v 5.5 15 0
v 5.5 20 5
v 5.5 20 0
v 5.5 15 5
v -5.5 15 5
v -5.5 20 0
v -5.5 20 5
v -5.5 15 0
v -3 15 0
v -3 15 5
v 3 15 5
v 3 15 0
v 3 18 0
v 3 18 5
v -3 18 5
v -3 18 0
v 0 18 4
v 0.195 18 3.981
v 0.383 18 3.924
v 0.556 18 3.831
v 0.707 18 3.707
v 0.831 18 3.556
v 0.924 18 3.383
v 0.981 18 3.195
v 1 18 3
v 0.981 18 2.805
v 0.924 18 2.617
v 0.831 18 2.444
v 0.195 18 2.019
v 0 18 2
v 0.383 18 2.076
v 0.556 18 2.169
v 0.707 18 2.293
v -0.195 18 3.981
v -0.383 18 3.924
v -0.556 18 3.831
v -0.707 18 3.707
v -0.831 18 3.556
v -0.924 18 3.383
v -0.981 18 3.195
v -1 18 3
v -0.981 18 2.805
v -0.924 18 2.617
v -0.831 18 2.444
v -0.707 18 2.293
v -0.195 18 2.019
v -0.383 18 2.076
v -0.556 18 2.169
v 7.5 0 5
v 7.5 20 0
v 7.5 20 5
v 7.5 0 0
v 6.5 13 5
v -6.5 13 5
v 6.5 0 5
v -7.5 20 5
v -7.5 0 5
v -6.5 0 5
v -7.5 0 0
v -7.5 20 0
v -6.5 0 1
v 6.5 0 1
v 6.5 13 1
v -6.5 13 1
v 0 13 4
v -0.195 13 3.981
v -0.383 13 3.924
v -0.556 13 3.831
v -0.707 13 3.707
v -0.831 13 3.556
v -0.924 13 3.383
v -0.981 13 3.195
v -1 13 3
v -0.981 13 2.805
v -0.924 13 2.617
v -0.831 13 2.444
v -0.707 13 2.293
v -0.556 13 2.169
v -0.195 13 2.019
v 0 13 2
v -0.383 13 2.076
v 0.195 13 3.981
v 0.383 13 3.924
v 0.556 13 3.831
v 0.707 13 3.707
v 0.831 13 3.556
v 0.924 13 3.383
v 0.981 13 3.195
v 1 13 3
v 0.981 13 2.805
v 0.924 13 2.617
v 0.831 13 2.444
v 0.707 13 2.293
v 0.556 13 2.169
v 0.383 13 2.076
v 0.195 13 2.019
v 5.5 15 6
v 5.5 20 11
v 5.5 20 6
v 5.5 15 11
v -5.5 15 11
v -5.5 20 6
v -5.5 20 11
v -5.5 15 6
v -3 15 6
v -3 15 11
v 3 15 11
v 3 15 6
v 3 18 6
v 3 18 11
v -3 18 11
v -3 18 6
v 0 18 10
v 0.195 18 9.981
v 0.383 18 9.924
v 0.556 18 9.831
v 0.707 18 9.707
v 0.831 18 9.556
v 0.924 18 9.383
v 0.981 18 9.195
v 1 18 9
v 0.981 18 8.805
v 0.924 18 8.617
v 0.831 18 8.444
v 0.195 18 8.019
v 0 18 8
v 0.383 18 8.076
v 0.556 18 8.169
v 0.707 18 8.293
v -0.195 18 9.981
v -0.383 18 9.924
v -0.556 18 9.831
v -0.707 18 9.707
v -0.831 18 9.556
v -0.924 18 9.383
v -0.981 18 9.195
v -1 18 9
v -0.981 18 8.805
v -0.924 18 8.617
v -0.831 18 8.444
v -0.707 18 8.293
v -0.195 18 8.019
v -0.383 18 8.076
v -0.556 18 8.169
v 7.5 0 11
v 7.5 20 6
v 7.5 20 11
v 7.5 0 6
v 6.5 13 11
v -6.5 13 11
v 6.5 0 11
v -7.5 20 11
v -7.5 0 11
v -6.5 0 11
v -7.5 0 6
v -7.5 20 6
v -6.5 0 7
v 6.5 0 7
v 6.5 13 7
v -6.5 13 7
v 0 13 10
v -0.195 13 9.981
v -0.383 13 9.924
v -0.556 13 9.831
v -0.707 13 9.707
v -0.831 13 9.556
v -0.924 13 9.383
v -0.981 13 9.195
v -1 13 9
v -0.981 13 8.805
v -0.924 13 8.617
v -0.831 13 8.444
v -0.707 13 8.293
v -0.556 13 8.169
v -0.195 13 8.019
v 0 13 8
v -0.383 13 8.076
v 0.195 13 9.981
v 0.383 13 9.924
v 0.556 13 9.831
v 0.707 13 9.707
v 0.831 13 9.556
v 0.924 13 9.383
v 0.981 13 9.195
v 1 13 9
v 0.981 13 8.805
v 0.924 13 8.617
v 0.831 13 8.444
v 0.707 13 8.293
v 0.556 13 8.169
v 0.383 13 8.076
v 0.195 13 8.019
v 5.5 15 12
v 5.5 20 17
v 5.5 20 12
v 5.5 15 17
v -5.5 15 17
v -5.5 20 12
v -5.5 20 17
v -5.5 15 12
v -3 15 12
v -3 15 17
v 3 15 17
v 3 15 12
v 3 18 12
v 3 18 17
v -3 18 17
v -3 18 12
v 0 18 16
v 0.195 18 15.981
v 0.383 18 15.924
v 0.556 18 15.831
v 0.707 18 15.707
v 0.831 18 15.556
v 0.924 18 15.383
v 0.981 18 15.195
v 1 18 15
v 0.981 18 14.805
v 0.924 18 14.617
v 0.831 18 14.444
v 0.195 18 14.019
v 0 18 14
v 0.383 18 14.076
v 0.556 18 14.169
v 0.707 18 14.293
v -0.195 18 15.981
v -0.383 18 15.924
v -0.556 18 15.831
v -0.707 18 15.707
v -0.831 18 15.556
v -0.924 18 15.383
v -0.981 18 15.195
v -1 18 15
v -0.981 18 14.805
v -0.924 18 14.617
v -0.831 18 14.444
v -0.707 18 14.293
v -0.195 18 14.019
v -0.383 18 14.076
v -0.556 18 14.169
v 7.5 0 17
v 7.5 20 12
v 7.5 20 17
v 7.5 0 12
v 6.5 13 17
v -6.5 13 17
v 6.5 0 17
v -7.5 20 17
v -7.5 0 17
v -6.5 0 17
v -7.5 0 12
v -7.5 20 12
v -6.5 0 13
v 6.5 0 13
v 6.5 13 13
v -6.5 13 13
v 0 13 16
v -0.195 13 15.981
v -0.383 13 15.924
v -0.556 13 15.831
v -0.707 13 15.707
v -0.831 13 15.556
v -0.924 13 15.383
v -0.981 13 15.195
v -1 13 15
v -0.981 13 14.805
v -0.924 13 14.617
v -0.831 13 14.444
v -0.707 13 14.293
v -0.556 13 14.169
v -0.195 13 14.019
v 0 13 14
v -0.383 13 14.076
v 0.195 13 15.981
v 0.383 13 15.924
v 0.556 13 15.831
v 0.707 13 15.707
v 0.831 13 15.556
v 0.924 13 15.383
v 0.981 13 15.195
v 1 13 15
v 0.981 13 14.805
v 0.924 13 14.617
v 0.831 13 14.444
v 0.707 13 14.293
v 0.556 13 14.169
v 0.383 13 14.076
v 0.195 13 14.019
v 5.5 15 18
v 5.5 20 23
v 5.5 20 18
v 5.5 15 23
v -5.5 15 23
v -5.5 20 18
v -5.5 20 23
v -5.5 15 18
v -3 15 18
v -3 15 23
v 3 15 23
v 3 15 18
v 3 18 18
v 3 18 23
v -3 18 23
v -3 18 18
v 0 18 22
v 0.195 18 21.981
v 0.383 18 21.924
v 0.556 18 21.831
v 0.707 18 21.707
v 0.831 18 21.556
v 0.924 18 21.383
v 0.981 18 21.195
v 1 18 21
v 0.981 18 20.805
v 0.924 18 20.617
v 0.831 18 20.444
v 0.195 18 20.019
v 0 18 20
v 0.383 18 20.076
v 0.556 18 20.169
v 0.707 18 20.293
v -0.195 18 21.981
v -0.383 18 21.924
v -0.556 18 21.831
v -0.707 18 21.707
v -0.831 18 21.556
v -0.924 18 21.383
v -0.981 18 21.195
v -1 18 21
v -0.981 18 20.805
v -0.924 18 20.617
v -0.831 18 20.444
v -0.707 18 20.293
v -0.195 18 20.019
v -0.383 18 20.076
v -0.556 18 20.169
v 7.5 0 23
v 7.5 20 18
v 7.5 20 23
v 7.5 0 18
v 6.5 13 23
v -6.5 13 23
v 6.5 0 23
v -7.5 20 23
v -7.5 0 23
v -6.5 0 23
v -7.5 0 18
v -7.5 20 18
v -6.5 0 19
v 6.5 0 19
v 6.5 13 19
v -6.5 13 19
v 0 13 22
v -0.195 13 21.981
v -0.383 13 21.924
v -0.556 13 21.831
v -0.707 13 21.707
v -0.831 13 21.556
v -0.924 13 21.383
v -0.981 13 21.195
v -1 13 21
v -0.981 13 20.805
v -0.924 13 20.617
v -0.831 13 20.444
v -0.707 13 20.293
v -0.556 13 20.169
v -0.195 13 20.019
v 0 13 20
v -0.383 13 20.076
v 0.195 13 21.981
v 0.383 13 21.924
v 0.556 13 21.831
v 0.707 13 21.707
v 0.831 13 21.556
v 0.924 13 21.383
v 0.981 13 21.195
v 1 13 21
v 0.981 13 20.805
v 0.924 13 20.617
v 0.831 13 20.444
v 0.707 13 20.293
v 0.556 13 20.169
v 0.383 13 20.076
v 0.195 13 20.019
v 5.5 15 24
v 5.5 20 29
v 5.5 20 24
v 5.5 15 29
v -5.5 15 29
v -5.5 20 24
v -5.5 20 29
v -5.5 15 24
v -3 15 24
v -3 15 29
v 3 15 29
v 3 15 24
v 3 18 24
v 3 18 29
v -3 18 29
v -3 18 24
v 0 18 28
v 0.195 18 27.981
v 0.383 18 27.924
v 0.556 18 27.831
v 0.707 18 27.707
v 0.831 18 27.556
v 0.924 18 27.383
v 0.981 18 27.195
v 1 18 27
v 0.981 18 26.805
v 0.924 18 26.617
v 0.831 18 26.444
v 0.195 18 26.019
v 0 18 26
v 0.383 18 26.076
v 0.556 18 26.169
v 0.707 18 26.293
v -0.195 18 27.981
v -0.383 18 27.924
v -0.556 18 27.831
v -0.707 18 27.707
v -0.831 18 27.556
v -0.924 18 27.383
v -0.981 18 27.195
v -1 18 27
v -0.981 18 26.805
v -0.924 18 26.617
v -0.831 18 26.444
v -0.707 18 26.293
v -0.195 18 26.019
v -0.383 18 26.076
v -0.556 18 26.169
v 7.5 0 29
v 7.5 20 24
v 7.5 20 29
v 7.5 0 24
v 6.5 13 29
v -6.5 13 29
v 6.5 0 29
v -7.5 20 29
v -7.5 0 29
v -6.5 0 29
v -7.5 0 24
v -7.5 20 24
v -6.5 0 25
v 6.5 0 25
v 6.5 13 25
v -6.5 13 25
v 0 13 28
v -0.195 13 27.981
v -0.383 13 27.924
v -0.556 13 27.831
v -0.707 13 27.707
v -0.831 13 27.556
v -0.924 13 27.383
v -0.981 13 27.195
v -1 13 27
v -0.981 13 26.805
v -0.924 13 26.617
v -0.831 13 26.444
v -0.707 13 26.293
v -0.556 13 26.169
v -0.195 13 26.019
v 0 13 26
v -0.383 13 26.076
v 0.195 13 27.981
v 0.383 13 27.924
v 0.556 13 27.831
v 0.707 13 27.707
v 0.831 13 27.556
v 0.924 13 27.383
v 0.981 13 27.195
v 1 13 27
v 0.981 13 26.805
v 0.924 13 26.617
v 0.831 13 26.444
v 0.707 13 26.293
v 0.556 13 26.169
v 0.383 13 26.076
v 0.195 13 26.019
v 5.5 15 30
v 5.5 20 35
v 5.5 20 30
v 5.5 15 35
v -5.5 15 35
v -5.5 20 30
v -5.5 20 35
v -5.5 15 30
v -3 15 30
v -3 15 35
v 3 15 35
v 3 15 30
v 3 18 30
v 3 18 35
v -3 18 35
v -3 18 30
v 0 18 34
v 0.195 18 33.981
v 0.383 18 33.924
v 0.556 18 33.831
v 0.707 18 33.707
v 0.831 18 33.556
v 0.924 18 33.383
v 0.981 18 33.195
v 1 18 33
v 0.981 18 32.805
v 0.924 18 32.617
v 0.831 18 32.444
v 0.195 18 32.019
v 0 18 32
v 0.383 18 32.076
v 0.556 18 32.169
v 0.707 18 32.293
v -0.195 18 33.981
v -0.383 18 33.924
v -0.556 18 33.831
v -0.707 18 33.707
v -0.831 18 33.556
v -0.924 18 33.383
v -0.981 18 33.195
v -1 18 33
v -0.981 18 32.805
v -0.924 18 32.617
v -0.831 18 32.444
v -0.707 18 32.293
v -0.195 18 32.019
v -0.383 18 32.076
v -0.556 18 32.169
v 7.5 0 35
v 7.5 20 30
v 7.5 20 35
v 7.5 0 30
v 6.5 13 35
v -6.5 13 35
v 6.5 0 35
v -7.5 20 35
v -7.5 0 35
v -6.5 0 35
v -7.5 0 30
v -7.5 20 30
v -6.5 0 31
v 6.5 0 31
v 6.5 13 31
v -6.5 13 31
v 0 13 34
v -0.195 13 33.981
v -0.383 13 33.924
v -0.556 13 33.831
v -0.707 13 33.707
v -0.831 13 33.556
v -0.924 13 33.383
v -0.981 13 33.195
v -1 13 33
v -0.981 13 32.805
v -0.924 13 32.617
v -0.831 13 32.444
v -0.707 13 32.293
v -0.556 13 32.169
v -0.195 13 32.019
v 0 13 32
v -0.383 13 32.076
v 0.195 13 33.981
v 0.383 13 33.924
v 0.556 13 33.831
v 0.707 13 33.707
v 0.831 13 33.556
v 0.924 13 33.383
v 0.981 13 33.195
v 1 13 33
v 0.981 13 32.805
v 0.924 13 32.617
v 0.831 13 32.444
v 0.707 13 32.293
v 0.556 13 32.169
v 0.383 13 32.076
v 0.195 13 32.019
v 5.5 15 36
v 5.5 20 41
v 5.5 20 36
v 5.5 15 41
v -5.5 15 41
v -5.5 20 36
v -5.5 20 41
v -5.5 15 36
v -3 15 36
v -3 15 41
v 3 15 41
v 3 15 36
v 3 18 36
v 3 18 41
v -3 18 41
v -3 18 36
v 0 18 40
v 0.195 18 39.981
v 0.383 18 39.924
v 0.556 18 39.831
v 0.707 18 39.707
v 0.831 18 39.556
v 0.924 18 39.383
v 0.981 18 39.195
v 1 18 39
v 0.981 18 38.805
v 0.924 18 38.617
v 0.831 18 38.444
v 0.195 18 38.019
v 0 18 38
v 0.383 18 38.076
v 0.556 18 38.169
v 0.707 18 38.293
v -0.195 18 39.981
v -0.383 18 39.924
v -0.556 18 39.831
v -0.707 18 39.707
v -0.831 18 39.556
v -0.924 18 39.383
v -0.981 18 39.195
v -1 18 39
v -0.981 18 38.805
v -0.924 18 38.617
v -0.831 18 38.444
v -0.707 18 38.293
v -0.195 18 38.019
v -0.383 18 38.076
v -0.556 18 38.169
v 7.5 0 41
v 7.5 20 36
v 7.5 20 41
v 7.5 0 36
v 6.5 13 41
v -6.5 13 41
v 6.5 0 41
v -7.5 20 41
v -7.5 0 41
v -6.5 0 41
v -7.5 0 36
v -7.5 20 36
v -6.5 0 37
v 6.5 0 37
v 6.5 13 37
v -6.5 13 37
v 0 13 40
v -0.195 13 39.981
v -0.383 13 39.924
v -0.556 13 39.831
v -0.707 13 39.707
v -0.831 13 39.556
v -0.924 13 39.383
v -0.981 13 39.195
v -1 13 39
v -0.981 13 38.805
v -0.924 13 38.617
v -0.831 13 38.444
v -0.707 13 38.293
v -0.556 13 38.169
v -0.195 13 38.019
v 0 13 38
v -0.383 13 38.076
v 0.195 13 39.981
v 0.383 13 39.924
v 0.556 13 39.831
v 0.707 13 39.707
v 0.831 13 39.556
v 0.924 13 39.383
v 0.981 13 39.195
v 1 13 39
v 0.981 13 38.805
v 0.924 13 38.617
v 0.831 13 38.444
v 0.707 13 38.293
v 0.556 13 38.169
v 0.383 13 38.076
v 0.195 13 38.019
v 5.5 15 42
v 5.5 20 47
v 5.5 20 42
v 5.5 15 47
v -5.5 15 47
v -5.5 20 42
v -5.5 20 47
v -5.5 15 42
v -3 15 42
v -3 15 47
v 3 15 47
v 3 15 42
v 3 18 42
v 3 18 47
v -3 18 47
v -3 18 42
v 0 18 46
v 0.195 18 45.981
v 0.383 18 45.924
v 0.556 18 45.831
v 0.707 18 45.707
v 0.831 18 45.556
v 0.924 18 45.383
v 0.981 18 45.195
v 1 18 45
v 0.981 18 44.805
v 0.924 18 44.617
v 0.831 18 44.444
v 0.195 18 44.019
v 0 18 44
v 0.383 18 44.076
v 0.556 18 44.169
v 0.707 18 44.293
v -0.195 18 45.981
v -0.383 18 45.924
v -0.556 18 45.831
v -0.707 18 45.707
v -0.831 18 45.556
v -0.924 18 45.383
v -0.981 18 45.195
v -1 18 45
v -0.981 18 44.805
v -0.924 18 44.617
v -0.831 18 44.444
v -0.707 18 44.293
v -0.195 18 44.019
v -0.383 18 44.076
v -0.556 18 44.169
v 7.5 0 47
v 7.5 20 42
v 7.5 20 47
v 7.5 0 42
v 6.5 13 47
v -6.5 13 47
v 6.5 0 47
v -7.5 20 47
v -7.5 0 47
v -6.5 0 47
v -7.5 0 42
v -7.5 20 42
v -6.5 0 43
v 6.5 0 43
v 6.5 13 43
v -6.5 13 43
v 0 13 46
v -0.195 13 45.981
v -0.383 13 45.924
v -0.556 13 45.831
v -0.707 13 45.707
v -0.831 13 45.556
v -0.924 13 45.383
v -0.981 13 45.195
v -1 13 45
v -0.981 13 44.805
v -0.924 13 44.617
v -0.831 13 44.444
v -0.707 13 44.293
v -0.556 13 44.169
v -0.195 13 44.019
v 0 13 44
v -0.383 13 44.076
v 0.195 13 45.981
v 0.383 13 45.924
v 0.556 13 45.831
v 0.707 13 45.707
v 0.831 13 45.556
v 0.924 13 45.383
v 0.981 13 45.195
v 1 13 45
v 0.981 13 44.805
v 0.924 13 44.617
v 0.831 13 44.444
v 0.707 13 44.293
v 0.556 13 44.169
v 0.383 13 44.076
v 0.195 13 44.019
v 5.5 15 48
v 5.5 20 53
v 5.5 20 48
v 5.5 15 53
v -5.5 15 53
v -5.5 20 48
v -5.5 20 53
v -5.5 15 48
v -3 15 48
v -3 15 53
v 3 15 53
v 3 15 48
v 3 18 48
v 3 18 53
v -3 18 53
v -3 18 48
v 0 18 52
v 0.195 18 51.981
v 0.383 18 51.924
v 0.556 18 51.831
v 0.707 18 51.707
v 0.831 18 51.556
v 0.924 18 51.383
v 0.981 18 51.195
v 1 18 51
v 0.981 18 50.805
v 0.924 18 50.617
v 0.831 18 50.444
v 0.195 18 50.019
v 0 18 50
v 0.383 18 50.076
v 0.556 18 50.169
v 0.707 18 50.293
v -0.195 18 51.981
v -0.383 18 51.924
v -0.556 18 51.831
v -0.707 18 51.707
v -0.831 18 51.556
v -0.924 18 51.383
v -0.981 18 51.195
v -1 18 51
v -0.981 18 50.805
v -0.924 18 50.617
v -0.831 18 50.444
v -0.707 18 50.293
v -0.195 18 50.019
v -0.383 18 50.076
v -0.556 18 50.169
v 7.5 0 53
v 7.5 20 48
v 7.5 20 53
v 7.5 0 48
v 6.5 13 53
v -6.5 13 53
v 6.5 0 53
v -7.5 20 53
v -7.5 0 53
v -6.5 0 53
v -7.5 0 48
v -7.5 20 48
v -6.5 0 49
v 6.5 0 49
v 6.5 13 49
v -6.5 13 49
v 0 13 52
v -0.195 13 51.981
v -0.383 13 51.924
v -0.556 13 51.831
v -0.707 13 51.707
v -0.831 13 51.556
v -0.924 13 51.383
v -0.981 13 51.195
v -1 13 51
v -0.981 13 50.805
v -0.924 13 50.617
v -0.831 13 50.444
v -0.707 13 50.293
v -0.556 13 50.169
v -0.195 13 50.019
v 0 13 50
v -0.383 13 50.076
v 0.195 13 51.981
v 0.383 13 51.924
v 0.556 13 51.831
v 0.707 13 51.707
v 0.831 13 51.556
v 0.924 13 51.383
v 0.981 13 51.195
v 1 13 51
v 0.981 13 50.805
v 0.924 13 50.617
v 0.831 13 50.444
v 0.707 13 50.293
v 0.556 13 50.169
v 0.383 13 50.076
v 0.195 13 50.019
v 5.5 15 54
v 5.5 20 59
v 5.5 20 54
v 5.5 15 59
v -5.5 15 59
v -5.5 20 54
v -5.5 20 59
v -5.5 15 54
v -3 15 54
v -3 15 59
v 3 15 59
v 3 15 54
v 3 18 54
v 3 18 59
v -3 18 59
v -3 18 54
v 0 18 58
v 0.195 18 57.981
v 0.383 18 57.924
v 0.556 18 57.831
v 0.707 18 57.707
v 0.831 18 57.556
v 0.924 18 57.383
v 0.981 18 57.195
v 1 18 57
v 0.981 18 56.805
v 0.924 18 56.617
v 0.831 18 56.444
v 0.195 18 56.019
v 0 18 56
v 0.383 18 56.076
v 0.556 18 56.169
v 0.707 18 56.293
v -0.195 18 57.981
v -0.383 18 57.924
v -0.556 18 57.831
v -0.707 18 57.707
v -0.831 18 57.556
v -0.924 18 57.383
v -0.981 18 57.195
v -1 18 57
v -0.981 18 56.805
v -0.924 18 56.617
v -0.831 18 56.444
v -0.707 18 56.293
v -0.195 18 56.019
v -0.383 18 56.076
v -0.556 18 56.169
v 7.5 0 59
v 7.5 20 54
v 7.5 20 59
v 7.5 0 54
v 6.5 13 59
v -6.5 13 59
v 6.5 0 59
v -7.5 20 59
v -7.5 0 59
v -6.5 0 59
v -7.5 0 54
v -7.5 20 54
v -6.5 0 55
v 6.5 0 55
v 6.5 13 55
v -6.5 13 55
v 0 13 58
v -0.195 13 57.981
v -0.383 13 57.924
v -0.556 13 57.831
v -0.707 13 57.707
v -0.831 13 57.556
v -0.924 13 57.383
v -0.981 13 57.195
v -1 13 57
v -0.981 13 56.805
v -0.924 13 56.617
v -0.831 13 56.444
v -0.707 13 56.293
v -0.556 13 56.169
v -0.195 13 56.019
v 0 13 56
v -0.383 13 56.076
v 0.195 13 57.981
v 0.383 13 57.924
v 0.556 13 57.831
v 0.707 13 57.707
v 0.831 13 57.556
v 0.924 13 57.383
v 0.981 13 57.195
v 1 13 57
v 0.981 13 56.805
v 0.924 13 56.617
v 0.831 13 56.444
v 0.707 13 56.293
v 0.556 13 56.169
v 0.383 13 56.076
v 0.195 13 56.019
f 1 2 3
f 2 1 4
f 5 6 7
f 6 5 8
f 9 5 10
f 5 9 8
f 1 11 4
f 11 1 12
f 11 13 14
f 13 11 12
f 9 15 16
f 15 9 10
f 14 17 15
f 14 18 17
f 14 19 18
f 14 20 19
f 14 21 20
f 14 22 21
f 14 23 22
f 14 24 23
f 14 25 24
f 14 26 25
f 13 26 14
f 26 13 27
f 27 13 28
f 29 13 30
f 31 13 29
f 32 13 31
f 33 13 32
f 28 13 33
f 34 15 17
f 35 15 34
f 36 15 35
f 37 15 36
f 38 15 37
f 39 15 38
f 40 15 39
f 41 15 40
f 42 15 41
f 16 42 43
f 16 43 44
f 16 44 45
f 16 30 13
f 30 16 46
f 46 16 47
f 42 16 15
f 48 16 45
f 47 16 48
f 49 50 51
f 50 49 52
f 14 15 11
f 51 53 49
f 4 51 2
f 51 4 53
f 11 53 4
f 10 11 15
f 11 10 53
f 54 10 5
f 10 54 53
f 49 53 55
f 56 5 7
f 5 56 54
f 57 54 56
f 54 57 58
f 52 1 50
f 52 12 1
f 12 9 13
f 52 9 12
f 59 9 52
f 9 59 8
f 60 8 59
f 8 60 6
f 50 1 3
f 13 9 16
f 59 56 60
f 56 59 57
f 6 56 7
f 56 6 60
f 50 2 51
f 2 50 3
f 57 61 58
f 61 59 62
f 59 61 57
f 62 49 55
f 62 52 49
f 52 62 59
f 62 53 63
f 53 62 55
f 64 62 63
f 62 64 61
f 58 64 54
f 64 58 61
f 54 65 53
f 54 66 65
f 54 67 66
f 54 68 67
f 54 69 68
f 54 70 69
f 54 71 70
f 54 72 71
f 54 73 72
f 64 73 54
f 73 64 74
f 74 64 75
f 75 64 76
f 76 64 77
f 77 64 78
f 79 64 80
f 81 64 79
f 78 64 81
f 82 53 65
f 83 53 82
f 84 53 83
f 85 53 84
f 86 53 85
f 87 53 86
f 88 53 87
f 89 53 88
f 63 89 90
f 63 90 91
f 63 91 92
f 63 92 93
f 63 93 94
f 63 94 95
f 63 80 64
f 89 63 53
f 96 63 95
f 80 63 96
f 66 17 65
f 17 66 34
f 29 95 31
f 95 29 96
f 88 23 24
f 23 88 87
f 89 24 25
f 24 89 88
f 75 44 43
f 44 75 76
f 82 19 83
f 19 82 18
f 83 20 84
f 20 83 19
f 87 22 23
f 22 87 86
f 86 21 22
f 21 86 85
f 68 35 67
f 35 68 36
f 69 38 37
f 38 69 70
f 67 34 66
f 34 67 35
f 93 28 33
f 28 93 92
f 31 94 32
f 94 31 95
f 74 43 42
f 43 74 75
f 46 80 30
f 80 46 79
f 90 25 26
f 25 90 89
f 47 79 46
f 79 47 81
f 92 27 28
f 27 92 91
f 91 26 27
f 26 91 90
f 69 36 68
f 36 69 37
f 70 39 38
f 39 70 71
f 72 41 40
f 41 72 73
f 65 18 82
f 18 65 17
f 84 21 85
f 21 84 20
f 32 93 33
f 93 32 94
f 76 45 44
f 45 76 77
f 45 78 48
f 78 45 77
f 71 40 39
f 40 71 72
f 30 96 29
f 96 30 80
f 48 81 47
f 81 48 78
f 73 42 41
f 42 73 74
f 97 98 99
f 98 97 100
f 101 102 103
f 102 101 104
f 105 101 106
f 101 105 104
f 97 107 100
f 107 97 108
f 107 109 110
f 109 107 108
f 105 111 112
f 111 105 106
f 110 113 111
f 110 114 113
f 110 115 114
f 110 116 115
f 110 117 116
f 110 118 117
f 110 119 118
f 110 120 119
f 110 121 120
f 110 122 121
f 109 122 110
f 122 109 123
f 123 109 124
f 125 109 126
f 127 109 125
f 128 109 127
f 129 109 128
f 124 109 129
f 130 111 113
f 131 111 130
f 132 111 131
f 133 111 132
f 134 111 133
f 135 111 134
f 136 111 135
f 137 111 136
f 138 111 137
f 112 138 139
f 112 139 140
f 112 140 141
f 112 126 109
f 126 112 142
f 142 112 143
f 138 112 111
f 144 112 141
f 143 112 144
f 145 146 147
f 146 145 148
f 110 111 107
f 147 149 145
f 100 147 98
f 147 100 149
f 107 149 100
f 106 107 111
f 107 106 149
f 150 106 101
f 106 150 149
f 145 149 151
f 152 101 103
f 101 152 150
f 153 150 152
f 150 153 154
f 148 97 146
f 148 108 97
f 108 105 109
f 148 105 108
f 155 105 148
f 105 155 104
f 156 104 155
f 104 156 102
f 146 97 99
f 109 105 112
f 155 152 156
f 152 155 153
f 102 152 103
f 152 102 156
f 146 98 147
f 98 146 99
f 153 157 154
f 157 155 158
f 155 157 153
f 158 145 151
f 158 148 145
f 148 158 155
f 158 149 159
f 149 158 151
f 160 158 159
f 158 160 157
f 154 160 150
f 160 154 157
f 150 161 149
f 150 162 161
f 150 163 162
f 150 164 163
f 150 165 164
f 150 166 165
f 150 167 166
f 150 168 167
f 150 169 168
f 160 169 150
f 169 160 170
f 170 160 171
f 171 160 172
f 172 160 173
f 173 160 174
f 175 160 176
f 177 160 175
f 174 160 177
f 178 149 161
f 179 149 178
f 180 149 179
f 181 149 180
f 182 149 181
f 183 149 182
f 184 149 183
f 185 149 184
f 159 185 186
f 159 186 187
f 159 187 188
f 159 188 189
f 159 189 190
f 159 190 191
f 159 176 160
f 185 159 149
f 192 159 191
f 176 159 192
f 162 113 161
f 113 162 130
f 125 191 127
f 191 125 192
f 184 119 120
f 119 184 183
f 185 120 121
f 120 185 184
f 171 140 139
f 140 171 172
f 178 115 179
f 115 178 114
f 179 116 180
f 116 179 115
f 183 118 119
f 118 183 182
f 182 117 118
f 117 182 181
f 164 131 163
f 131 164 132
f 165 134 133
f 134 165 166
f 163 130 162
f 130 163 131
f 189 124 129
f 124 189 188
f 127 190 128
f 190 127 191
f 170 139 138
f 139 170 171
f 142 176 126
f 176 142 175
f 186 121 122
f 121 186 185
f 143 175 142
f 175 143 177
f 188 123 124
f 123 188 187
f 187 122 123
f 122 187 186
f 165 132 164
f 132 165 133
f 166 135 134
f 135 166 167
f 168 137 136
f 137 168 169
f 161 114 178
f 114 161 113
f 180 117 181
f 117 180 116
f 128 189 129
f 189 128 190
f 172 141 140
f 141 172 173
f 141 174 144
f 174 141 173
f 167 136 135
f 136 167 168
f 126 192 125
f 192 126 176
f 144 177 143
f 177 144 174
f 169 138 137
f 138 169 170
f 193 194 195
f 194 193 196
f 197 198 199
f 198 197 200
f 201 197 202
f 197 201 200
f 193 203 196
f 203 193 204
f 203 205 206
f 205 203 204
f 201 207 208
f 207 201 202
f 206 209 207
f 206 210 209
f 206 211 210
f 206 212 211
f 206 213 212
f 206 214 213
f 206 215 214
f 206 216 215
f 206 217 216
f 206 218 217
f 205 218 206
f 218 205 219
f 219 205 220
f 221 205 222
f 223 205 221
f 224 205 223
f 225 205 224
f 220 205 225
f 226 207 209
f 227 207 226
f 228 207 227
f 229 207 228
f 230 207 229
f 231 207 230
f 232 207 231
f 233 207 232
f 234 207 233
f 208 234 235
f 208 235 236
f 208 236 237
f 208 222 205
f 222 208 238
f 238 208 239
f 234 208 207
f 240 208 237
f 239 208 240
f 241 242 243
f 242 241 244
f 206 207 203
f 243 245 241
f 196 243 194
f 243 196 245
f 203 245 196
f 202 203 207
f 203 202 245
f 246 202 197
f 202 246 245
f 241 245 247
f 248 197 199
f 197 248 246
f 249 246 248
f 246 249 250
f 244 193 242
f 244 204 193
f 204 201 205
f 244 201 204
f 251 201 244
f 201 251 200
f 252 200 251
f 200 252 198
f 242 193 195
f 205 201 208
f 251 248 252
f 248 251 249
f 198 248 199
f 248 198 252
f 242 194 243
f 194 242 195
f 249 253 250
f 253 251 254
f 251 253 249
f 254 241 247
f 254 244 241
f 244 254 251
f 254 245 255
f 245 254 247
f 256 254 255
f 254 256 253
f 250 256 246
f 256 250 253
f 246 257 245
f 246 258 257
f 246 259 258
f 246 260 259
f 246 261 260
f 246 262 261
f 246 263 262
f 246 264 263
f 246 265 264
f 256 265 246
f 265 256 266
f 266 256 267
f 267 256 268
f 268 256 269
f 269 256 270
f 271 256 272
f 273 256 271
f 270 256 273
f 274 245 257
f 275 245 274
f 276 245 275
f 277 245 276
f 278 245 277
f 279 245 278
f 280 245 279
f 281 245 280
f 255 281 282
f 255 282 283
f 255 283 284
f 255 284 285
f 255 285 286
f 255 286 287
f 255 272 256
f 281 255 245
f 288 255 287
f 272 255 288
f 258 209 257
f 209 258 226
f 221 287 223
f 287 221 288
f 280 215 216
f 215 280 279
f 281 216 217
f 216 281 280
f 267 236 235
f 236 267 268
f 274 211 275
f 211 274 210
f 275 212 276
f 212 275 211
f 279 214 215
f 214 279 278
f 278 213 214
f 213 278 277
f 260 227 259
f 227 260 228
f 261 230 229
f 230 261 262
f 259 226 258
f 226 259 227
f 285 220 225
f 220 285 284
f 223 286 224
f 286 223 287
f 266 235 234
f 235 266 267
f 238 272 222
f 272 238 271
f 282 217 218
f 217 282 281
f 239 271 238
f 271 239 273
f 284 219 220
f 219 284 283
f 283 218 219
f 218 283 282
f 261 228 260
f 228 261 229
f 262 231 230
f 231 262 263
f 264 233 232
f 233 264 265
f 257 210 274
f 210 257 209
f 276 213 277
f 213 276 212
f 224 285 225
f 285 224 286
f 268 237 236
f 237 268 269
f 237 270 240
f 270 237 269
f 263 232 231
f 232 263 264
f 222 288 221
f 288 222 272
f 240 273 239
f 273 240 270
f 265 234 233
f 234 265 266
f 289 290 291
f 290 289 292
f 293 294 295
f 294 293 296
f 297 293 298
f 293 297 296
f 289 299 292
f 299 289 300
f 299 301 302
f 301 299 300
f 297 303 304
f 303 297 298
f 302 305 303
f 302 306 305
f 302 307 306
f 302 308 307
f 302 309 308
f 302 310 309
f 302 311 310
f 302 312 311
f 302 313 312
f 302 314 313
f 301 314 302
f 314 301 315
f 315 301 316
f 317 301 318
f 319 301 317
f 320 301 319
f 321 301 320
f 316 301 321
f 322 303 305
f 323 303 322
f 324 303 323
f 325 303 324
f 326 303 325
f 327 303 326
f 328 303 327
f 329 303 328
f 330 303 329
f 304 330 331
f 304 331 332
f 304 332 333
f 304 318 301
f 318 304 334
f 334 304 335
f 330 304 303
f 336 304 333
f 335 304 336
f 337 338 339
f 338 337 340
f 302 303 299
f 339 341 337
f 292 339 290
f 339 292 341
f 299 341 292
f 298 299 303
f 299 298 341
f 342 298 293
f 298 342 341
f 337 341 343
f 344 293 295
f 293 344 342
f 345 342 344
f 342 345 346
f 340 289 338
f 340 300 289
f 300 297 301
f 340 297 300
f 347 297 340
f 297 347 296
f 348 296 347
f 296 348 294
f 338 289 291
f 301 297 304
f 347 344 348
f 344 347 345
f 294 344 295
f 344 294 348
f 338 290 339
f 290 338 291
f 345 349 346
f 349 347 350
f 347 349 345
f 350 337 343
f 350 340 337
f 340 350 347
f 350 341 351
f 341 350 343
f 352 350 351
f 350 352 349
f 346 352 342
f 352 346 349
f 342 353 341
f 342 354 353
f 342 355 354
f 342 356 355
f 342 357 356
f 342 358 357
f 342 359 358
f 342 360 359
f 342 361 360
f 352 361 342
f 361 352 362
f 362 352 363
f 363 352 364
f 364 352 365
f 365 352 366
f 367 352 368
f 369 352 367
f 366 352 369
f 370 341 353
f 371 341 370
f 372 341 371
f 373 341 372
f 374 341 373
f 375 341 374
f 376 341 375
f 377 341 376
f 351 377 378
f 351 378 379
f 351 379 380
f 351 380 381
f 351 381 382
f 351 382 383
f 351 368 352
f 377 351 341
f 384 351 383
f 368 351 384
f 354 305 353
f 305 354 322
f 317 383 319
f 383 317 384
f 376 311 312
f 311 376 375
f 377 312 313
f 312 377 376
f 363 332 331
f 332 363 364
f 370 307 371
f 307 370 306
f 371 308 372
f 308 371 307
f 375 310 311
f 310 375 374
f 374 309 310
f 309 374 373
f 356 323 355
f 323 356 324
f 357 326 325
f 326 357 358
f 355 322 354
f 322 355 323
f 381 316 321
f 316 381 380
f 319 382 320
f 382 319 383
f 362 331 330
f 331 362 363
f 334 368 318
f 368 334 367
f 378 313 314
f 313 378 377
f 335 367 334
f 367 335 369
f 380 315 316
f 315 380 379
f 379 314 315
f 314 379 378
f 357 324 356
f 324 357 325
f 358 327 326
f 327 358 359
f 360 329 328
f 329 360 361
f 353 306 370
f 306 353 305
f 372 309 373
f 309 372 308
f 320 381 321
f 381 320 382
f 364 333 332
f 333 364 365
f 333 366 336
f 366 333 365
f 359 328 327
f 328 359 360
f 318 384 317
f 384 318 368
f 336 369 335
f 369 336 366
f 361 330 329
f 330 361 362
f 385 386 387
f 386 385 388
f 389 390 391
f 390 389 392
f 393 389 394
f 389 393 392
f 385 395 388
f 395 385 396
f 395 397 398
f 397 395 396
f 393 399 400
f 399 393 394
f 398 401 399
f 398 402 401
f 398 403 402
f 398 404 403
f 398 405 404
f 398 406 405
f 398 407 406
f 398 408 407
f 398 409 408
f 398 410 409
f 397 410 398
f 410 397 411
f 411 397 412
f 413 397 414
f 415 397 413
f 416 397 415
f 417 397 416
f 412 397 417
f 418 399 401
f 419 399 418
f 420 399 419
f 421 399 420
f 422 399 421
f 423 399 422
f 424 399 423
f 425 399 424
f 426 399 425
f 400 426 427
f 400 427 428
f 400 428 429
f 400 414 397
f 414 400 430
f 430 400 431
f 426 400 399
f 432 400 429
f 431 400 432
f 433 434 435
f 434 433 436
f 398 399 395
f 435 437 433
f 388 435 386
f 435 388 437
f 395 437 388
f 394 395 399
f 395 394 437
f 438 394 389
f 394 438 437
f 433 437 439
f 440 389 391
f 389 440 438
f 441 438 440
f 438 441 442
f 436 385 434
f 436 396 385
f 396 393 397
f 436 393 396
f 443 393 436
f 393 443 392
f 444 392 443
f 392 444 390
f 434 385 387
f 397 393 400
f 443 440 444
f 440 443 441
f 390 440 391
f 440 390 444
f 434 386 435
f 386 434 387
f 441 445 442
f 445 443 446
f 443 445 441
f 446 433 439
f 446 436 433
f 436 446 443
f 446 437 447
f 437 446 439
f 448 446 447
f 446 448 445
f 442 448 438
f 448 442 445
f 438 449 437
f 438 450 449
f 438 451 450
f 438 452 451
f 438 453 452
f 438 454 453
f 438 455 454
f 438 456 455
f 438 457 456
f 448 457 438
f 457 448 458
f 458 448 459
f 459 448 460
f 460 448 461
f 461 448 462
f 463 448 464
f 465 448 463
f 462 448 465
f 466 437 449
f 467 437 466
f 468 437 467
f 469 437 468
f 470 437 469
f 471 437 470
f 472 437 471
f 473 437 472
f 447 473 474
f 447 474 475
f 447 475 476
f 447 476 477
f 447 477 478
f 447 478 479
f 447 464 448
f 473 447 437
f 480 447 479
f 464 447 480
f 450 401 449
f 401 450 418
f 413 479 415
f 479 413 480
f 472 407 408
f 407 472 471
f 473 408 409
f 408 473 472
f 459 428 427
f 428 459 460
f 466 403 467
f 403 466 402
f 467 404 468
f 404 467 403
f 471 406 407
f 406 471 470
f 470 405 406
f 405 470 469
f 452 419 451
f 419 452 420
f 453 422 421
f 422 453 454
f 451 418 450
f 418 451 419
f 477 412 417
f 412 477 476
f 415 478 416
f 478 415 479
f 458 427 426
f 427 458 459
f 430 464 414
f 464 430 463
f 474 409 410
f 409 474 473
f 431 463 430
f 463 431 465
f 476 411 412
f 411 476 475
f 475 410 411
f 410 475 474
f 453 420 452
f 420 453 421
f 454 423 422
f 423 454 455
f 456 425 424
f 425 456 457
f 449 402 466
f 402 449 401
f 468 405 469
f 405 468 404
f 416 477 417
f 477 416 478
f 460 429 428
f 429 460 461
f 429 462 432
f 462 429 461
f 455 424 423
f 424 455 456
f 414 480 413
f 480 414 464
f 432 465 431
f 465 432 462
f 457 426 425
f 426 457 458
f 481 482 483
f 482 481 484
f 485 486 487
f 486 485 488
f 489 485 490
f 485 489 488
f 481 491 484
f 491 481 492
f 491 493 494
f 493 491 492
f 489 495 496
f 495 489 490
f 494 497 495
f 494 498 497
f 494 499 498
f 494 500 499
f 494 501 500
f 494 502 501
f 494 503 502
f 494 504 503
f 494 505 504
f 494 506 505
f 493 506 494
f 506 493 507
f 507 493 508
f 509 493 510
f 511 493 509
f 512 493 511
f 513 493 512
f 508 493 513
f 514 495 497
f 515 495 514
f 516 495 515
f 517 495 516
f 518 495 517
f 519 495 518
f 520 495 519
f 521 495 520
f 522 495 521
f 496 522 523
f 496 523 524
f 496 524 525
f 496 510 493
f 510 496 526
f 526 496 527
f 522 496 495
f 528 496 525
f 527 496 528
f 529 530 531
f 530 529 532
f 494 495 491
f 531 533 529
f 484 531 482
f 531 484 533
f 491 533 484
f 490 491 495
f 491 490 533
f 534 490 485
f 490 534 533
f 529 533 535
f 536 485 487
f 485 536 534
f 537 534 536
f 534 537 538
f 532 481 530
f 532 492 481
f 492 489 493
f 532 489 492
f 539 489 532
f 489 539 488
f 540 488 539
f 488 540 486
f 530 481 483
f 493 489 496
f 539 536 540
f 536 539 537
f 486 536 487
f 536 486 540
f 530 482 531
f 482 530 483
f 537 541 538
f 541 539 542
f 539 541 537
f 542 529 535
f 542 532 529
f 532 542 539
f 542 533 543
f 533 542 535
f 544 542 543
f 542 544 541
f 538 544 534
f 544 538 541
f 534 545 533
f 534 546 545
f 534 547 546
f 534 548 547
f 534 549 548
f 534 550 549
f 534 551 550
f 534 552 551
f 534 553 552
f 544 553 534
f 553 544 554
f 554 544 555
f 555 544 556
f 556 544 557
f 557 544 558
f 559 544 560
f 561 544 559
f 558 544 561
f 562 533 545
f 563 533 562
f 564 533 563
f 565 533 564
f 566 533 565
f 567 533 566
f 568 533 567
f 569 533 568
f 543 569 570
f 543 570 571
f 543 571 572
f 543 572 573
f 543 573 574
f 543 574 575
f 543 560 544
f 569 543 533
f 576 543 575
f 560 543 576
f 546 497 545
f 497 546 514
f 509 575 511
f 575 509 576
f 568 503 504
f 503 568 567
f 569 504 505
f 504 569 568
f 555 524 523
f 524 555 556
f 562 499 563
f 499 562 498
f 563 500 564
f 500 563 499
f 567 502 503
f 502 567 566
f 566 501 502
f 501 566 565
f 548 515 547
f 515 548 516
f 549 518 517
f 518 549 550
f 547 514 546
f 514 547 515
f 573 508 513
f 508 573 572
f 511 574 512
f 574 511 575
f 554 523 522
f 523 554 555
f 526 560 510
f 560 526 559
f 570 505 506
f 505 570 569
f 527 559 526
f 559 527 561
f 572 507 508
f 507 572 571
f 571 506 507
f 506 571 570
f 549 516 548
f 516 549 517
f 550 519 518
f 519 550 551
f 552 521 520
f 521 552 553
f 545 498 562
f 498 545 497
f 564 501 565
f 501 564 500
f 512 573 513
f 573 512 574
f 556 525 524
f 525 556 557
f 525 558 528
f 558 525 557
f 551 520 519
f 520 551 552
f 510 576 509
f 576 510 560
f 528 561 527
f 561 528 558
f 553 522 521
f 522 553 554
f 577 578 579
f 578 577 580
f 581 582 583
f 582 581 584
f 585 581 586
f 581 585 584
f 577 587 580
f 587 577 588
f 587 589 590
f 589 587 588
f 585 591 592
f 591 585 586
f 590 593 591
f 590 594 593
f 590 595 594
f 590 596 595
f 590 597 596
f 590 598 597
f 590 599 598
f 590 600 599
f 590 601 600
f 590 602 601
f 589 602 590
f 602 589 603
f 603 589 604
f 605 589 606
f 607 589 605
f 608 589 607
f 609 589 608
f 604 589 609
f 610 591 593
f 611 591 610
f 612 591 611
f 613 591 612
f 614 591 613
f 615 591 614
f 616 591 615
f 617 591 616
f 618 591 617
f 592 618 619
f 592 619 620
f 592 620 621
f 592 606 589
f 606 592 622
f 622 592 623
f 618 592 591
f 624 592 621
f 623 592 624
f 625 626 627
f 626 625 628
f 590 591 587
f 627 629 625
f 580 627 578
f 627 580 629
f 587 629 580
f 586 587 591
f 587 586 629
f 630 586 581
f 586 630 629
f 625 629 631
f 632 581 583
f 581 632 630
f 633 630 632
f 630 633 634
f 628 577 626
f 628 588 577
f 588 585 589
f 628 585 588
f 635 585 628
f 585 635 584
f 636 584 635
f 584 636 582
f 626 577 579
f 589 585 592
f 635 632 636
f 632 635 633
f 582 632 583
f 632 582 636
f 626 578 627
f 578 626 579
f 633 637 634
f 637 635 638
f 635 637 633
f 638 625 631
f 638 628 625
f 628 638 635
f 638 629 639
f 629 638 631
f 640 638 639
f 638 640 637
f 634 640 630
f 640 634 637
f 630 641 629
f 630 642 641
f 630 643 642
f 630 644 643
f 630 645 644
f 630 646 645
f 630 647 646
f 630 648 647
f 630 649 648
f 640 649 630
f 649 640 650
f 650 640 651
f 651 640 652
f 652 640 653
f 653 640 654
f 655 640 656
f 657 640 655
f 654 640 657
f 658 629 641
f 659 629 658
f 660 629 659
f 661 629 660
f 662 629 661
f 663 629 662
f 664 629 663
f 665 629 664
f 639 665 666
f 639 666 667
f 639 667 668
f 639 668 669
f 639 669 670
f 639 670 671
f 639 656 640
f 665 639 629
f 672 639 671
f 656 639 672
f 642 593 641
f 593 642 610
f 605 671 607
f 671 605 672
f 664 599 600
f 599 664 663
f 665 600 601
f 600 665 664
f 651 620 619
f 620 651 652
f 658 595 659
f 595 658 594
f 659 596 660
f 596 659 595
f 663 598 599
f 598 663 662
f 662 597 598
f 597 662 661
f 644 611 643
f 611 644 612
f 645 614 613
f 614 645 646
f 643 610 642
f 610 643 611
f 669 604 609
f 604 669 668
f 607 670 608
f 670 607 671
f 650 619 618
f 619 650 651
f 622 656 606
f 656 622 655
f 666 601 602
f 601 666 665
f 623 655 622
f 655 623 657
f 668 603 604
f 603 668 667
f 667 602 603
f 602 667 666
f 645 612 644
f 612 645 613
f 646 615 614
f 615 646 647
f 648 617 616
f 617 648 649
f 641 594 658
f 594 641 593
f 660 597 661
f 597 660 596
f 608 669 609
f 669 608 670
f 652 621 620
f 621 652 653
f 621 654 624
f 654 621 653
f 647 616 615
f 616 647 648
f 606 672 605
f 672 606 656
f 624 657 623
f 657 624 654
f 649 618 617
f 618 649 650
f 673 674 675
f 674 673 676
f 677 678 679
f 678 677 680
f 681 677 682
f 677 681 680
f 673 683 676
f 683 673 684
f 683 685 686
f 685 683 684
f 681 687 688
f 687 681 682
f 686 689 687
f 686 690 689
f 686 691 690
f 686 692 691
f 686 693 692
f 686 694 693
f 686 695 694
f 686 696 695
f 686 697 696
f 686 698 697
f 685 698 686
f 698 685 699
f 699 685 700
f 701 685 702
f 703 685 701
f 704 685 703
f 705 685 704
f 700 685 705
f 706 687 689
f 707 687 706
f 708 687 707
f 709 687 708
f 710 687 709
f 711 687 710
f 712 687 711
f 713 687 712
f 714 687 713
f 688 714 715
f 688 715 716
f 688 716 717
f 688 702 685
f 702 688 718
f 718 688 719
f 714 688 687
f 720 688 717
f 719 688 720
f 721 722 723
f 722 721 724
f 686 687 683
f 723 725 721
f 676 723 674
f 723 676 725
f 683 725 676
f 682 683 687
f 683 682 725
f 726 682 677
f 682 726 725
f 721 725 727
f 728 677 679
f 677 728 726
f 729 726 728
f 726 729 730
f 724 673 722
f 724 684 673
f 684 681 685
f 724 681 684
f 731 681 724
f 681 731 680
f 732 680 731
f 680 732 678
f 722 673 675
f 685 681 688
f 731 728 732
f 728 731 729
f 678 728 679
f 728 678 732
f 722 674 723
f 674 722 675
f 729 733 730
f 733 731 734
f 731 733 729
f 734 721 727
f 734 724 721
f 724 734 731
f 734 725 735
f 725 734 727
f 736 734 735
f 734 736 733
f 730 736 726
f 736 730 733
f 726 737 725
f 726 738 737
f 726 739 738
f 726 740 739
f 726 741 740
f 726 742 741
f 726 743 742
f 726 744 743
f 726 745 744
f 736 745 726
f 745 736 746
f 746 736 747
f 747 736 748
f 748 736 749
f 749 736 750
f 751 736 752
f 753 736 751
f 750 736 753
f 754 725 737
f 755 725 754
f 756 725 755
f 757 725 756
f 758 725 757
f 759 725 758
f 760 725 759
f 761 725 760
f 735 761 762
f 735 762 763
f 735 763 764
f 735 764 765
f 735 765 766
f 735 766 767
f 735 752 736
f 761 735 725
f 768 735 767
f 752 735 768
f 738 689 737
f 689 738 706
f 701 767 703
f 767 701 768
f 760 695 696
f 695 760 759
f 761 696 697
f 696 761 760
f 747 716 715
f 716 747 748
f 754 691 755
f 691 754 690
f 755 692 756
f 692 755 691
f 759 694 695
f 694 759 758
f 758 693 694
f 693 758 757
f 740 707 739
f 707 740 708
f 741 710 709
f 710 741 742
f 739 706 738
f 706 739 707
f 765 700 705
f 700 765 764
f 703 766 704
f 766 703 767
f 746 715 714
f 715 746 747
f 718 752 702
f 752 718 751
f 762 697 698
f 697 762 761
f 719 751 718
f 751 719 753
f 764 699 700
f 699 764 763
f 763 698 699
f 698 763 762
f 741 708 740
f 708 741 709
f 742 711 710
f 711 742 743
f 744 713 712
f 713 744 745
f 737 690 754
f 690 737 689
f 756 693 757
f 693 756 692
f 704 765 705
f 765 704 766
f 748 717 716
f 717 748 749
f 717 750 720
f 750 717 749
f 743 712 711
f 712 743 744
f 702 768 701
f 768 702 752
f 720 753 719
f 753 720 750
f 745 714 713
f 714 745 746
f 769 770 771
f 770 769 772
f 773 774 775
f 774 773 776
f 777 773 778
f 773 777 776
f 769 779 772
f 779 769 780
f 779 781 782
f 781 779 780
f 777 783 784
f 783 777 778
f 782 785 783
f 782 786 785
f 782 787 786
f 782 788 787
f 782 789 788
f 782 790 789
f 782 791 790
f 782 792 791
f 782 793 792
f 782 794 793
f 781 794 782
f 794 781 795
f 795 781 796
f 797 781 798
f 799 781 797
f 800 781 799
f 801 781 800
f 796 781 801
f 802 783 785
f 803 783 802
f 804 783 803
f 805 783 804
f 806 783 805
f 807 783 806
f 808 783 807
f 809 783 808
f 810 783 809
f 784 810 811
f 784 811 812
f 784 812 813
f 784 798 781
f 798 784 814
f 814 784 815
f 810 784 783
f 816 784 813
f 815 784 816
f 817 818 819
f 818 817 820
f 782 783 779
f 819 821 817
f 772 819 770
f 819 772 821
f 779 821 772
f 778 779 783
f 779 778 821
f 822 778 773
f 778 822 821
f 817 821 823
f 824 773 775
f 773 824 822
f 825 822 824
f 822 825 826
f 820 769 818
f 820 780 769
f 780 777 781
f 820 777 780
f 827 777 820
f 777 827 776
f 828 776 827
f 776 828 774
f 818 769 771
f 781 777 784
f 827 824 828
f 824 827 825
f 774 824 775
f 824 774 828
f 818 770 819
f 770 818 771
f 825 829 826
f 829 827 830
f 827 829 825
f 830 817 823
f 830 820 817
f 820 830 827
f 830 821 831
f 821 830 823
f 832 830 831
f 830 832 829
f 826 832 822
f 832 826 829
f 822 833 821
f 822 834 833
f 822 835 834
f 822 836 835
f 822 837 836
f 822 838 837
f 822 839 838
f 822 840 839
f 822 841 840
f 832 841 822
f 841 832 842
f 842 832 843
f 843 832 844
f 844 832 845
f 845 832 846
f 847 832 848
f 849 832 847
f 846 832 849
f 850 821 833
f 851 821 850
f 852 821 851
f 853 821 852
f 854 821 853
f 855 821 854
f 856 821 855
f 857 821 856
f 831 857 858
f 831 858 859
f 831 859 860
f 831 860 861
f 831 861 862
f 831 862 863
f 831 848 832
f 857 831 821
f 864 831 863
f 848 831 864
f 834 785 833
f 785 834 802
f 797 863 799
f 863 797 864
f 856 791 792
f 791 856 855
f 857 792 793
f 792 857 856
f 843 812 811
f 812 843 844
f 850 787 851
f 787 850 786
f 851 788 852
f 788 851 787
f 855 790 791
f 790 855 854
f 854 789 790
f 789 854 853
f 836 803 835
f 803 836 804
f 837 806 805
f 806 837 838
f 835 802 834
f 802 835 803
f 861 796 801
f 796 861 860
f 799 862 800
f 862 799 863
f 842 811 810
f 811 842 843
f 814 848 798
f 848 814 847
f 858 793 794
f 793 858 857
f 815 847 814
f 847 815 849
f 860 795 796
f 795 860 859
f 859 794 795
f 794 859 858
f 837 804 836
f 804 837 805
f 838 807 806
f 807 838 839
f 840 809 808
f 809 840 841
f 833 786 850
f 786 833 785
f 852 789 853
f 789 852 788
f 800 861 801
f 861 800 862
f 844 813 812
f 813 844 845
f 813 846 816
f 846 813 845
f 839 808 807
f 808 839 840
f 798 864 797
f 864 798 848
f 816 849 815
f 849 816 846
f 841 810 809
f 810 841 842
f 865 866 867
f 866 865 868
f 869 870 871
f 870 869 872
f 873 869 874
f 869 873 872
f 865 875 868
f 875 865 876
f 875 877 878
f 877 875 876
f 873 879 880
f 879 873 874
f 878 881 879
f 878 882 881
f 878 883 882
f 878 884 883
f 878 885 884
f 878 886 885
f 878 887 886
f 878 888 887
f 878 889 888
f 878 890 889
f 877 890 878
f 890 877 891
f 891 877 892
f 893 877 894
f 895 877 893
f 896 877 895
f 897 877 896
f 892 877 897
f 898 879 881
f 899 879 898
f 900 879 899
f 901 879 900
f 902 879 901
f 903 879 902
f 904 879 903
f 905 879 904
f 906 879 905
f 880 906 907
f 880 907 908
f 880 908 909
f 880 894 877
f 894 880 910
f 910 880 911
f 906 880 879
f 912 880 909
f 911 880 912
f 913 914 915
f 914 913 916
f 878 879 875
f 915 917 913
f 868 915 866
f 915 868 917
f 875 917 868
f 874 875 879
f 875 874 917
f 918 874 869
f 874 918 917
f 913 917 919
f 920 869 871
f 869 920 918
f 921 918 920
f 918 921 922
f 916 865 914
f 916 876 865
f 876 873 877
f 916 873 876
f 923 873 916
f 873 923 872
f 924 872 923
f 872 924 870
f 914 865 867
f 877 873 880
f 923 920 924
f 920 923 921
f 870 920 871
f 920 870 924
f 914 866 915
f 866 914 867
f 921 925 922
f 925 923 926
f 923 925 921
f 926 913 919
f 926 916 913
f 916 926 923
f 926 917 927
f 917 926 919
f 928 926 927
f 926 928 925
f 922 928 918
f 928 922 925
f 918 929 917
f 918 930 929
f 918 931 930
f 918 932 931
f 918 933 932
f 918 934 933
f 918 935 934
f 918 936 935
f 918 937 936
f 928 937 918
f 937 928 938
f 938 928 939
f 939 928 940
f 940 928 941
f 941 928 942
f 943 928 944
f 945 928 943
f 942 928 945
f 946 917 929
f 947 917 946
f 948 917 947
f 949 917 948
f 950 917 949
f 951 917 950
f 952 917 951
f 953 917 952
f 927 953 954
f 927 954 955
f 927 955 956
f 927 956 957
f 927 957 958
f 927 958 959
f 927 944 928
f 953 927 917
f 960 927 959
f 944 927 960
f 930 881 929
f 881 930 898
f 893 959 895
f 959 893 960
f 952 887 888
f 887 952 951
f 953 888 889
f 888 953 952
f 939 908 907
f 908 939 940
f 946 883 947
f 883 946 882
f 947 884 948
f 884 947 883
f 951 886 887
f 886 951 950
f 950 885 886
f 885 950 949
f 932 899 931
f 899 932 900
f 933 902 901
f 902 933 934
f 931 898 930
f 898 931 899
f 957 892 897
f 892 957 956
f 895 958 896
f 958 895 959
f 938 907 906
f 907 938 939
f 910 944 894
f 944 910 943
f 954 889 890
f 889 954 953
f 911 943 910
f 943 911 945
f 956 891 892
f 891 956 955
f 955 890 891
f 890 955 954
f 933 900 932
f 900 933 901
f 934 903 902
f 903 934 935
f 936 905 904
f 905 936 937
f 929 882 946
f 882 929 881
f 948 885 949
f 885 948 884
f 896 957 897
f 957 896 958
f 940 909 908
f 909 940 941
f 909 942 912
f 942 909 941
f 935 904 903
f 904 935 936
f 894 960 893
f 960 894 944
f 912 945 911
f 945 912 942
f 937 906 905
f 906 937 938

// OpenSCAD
module FiddleEndStop() {
	difference() {
		translate([-7.5,0,0])
			cube([15,20,5]);
		difference() {
			translate([-5.5,15,-1])
				cube([11,6,7]);
			translate([-3,15,-2])
				cube([6,3,9]);
		}
		translate([-6.5,-1,1])
			cube([13,14,5]);
		translate([0,22,3])
			rotate([90,0,0])
				cylinder(r=1,h=15, $fn=32);
	}
}

for(i=[0:9])
	translate([0,0,6 * i])
		FiddleEndStop();
